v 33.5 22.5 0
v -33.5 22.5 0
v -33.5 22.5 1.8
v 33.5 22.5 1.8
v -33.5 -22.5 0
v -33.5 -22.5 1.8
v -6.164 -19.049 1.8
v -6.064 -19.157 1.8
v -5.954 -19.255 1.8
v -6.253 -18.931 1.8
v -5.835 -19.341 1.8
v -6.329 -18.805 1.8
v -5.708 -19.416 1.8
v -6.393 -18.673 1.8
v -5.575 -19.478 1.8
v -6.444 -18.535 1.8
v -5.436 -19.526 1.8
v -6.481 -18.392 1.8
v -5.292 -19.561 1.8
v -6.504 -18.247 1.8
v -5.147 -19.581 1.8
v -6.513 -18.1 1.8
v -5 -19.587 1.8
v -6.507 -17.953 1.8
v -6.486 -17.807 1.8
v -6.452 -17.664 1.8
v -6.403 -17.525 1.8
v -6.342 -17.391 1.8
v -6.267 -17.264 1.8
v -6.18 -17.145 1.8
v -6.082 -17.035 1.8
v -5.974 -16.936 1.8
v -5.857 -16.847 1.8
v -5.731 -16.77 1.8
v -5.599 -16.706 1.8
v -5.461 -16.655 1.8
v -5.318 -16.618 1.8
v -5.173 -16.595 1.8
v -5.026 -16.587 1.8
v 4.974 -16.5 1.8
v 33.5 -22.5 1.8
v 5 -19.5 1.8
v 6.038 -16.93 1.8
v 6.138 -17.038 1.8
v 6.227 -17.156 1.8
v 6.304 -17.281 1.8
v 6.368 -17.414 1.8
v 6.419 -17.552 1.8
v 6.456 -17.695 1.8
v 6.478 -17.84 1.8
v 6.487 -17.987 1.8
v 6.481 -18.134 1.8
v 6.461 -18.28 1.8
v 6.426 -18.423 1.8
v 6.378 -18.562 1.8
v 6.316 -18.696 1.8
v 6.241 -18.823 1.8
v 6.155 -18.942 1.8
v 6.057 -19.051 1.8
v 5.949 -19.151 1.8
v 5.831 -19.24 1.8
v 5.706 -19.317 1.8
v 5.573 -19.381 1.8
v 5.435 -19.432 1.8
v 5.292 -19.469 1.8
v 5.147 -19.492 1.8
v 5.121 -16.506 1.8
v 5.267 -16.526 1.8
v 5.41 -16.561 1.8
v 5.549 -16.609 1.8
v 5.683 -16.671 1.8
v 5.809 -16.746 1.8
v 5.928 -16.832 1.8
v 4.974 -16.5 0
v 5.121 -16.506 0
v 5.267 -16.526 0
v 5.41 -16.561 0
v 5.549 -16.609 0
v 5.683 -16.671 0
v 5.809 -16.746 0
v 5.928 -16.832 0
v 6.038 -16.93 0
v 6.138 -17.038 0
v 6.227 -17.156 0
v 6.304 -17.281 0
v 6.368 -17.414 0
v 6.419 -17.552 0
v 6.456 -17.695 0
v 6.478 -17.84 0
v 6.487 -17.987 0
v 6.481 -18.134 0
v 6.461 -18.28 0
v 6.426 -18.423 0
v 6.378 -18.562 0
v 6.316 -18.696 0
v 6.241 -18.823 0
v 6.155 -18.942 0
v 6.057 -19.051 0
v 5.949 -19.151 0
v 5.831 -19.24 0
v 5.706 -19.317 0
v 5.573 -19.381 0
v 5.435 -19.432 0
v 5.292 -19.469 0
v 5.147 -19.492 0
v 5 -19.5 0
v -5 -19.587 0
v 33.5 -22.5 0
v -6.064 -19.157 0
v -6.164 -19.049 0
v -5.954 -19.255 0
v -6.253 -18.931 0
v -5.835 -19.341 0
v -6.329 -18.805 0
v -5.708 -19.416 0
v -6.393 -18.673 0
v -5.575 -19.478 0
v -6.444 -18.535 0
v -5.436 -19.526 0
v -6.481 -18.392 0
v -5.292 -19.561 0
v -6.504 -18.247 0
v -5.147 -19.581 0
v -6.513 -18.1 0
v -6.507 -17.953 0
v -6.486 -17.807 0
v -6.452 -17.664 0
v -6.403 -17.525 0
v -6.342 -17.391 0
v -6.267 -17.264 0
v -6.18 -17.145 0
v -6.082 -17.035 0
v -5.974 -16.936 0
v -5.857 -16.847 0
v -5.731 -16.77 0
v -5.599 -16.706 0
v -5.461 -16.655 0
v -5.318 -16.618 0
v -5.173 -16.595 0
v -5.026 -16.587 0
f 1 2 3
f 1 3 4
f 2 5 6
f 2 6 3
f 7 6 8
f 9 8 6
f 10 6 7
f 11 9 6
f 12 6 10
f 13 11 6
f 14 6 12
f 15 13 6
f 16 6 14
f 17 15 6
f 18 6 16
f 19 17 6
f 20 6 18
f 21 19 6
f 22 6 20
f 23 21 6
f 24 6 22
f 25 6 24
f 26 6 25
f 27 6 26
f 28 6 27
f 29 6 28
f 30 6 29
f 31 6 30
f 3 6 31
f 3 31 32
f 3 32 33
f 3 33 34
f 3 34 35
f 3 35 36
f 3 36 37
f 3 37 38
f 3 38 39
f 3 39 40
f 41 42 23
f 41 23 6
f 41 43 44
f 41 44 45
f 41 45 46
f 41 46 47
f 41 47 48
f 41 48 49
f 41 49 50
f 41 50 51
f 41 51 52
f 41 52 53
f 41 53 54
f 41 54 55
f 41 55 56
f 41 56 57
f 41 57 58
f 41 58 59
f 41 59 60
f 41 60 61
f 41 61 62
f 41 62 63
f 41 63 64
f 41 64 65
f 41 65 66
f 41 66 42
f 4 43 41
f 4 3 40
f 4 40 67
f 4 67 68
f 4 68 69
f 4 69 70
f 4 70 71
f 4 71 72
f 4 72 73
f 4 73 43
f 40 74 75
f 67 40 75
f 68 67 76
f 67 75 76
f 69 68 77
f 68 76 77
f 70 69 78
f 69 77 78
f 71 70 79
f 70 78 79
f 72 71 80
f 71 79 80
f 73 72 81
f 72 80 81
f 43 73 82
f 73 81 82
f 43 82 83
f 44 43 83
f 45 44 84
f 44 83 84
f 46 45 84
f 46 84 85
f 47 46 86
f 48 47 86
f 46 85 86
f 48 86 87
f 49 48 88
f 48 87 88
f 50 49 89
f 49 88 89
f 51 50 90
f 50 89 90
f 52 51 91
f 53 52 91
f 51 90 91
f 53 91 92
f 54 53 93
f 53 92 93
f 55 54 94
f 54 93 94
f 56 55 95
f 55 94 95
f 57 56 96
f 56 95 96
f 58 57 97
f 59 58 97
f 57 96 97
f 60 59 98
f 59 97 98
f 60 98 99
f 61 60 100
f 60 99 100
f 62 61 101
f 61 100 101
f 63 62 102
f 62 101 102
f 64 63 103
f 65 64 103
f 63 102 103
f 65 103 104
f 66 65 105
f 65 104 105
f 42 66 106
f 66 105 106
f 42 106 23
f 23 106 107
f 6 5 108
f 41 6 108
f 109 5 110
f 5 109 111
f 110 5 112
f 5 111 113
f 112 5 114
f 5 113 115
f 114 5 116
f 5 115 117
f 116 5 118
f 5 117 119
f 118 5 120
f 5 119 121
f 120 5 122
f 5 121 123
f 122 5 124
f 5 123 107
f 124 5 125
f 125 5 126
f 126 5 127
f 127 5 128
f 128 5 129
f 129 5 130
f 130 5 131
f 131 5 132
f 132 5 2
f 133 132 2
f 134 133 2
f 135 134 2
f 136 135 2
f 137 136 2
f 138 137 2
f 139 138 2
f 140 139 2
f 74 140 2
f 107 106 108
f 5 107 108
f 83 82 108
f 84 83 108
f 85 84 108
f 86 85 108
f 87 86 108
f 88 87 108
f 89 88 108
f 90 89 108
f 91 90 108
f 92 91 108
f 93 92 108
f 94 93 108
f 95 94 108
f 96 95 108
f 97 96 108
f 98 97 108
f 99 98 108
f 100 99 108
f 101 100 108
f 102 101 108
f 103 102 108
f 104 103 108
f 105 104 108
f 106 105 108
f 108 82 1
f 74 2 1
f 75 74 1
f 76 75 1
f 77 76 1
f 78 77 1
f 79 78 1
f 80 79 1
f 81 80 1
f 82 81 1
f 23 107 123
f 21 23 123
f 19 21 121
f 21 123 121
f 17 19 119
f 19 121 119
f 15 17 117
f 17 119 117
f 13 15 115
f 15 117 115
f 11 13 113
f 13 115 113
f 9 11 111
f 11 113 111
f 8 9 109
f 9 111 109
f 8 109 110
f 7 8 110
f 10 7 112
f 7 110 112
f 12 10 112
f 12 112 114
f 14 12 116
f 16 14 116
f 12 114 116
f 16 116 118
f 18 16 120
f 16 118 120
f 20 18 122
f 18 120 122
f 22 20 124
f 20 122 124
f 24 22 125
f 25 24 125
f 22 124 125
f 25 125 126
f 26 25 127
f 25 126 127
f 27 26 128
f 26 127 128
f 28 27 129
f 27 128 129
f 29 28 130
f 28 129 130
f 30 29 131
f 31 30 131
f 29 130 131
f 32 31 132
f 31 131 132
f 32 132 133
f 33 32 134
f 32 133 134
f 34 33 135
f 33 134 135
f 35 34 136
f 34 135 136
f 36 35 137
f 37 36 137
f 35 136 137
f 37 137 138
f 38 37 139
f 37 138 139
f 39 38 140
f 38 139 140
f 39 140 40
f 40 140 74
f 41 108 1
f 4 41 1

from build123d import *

# Parameters (mm, degrees)
F0_W     = 67
F0_H     = 45
F1_DEPTH = 1.8


with BuildPart() as f1:
    # F0 (on Top) → F1 (new body)
    with BuildSketch(Plane.XY):
        Rectangle(F0_W, F0_H)
        with BuildLine():
            ThreePointArc((-4.999623, -19.586849), (-6.512594, -18.099933), (-5.025678, -16.586962))
            Line((-5.025678, -16.586962), (4.973945, -16.500113))
            ThreePointArc((4.973945, -16.500113), (6.486916, -17.987029), (5, -19.5))
            Line((5, -19.5), (-4.999623, -19.586849))
        make_face(mode=Mode.SUBTRACT)
    extrude(amount=F1_DEPTH)


solid = f1.part
